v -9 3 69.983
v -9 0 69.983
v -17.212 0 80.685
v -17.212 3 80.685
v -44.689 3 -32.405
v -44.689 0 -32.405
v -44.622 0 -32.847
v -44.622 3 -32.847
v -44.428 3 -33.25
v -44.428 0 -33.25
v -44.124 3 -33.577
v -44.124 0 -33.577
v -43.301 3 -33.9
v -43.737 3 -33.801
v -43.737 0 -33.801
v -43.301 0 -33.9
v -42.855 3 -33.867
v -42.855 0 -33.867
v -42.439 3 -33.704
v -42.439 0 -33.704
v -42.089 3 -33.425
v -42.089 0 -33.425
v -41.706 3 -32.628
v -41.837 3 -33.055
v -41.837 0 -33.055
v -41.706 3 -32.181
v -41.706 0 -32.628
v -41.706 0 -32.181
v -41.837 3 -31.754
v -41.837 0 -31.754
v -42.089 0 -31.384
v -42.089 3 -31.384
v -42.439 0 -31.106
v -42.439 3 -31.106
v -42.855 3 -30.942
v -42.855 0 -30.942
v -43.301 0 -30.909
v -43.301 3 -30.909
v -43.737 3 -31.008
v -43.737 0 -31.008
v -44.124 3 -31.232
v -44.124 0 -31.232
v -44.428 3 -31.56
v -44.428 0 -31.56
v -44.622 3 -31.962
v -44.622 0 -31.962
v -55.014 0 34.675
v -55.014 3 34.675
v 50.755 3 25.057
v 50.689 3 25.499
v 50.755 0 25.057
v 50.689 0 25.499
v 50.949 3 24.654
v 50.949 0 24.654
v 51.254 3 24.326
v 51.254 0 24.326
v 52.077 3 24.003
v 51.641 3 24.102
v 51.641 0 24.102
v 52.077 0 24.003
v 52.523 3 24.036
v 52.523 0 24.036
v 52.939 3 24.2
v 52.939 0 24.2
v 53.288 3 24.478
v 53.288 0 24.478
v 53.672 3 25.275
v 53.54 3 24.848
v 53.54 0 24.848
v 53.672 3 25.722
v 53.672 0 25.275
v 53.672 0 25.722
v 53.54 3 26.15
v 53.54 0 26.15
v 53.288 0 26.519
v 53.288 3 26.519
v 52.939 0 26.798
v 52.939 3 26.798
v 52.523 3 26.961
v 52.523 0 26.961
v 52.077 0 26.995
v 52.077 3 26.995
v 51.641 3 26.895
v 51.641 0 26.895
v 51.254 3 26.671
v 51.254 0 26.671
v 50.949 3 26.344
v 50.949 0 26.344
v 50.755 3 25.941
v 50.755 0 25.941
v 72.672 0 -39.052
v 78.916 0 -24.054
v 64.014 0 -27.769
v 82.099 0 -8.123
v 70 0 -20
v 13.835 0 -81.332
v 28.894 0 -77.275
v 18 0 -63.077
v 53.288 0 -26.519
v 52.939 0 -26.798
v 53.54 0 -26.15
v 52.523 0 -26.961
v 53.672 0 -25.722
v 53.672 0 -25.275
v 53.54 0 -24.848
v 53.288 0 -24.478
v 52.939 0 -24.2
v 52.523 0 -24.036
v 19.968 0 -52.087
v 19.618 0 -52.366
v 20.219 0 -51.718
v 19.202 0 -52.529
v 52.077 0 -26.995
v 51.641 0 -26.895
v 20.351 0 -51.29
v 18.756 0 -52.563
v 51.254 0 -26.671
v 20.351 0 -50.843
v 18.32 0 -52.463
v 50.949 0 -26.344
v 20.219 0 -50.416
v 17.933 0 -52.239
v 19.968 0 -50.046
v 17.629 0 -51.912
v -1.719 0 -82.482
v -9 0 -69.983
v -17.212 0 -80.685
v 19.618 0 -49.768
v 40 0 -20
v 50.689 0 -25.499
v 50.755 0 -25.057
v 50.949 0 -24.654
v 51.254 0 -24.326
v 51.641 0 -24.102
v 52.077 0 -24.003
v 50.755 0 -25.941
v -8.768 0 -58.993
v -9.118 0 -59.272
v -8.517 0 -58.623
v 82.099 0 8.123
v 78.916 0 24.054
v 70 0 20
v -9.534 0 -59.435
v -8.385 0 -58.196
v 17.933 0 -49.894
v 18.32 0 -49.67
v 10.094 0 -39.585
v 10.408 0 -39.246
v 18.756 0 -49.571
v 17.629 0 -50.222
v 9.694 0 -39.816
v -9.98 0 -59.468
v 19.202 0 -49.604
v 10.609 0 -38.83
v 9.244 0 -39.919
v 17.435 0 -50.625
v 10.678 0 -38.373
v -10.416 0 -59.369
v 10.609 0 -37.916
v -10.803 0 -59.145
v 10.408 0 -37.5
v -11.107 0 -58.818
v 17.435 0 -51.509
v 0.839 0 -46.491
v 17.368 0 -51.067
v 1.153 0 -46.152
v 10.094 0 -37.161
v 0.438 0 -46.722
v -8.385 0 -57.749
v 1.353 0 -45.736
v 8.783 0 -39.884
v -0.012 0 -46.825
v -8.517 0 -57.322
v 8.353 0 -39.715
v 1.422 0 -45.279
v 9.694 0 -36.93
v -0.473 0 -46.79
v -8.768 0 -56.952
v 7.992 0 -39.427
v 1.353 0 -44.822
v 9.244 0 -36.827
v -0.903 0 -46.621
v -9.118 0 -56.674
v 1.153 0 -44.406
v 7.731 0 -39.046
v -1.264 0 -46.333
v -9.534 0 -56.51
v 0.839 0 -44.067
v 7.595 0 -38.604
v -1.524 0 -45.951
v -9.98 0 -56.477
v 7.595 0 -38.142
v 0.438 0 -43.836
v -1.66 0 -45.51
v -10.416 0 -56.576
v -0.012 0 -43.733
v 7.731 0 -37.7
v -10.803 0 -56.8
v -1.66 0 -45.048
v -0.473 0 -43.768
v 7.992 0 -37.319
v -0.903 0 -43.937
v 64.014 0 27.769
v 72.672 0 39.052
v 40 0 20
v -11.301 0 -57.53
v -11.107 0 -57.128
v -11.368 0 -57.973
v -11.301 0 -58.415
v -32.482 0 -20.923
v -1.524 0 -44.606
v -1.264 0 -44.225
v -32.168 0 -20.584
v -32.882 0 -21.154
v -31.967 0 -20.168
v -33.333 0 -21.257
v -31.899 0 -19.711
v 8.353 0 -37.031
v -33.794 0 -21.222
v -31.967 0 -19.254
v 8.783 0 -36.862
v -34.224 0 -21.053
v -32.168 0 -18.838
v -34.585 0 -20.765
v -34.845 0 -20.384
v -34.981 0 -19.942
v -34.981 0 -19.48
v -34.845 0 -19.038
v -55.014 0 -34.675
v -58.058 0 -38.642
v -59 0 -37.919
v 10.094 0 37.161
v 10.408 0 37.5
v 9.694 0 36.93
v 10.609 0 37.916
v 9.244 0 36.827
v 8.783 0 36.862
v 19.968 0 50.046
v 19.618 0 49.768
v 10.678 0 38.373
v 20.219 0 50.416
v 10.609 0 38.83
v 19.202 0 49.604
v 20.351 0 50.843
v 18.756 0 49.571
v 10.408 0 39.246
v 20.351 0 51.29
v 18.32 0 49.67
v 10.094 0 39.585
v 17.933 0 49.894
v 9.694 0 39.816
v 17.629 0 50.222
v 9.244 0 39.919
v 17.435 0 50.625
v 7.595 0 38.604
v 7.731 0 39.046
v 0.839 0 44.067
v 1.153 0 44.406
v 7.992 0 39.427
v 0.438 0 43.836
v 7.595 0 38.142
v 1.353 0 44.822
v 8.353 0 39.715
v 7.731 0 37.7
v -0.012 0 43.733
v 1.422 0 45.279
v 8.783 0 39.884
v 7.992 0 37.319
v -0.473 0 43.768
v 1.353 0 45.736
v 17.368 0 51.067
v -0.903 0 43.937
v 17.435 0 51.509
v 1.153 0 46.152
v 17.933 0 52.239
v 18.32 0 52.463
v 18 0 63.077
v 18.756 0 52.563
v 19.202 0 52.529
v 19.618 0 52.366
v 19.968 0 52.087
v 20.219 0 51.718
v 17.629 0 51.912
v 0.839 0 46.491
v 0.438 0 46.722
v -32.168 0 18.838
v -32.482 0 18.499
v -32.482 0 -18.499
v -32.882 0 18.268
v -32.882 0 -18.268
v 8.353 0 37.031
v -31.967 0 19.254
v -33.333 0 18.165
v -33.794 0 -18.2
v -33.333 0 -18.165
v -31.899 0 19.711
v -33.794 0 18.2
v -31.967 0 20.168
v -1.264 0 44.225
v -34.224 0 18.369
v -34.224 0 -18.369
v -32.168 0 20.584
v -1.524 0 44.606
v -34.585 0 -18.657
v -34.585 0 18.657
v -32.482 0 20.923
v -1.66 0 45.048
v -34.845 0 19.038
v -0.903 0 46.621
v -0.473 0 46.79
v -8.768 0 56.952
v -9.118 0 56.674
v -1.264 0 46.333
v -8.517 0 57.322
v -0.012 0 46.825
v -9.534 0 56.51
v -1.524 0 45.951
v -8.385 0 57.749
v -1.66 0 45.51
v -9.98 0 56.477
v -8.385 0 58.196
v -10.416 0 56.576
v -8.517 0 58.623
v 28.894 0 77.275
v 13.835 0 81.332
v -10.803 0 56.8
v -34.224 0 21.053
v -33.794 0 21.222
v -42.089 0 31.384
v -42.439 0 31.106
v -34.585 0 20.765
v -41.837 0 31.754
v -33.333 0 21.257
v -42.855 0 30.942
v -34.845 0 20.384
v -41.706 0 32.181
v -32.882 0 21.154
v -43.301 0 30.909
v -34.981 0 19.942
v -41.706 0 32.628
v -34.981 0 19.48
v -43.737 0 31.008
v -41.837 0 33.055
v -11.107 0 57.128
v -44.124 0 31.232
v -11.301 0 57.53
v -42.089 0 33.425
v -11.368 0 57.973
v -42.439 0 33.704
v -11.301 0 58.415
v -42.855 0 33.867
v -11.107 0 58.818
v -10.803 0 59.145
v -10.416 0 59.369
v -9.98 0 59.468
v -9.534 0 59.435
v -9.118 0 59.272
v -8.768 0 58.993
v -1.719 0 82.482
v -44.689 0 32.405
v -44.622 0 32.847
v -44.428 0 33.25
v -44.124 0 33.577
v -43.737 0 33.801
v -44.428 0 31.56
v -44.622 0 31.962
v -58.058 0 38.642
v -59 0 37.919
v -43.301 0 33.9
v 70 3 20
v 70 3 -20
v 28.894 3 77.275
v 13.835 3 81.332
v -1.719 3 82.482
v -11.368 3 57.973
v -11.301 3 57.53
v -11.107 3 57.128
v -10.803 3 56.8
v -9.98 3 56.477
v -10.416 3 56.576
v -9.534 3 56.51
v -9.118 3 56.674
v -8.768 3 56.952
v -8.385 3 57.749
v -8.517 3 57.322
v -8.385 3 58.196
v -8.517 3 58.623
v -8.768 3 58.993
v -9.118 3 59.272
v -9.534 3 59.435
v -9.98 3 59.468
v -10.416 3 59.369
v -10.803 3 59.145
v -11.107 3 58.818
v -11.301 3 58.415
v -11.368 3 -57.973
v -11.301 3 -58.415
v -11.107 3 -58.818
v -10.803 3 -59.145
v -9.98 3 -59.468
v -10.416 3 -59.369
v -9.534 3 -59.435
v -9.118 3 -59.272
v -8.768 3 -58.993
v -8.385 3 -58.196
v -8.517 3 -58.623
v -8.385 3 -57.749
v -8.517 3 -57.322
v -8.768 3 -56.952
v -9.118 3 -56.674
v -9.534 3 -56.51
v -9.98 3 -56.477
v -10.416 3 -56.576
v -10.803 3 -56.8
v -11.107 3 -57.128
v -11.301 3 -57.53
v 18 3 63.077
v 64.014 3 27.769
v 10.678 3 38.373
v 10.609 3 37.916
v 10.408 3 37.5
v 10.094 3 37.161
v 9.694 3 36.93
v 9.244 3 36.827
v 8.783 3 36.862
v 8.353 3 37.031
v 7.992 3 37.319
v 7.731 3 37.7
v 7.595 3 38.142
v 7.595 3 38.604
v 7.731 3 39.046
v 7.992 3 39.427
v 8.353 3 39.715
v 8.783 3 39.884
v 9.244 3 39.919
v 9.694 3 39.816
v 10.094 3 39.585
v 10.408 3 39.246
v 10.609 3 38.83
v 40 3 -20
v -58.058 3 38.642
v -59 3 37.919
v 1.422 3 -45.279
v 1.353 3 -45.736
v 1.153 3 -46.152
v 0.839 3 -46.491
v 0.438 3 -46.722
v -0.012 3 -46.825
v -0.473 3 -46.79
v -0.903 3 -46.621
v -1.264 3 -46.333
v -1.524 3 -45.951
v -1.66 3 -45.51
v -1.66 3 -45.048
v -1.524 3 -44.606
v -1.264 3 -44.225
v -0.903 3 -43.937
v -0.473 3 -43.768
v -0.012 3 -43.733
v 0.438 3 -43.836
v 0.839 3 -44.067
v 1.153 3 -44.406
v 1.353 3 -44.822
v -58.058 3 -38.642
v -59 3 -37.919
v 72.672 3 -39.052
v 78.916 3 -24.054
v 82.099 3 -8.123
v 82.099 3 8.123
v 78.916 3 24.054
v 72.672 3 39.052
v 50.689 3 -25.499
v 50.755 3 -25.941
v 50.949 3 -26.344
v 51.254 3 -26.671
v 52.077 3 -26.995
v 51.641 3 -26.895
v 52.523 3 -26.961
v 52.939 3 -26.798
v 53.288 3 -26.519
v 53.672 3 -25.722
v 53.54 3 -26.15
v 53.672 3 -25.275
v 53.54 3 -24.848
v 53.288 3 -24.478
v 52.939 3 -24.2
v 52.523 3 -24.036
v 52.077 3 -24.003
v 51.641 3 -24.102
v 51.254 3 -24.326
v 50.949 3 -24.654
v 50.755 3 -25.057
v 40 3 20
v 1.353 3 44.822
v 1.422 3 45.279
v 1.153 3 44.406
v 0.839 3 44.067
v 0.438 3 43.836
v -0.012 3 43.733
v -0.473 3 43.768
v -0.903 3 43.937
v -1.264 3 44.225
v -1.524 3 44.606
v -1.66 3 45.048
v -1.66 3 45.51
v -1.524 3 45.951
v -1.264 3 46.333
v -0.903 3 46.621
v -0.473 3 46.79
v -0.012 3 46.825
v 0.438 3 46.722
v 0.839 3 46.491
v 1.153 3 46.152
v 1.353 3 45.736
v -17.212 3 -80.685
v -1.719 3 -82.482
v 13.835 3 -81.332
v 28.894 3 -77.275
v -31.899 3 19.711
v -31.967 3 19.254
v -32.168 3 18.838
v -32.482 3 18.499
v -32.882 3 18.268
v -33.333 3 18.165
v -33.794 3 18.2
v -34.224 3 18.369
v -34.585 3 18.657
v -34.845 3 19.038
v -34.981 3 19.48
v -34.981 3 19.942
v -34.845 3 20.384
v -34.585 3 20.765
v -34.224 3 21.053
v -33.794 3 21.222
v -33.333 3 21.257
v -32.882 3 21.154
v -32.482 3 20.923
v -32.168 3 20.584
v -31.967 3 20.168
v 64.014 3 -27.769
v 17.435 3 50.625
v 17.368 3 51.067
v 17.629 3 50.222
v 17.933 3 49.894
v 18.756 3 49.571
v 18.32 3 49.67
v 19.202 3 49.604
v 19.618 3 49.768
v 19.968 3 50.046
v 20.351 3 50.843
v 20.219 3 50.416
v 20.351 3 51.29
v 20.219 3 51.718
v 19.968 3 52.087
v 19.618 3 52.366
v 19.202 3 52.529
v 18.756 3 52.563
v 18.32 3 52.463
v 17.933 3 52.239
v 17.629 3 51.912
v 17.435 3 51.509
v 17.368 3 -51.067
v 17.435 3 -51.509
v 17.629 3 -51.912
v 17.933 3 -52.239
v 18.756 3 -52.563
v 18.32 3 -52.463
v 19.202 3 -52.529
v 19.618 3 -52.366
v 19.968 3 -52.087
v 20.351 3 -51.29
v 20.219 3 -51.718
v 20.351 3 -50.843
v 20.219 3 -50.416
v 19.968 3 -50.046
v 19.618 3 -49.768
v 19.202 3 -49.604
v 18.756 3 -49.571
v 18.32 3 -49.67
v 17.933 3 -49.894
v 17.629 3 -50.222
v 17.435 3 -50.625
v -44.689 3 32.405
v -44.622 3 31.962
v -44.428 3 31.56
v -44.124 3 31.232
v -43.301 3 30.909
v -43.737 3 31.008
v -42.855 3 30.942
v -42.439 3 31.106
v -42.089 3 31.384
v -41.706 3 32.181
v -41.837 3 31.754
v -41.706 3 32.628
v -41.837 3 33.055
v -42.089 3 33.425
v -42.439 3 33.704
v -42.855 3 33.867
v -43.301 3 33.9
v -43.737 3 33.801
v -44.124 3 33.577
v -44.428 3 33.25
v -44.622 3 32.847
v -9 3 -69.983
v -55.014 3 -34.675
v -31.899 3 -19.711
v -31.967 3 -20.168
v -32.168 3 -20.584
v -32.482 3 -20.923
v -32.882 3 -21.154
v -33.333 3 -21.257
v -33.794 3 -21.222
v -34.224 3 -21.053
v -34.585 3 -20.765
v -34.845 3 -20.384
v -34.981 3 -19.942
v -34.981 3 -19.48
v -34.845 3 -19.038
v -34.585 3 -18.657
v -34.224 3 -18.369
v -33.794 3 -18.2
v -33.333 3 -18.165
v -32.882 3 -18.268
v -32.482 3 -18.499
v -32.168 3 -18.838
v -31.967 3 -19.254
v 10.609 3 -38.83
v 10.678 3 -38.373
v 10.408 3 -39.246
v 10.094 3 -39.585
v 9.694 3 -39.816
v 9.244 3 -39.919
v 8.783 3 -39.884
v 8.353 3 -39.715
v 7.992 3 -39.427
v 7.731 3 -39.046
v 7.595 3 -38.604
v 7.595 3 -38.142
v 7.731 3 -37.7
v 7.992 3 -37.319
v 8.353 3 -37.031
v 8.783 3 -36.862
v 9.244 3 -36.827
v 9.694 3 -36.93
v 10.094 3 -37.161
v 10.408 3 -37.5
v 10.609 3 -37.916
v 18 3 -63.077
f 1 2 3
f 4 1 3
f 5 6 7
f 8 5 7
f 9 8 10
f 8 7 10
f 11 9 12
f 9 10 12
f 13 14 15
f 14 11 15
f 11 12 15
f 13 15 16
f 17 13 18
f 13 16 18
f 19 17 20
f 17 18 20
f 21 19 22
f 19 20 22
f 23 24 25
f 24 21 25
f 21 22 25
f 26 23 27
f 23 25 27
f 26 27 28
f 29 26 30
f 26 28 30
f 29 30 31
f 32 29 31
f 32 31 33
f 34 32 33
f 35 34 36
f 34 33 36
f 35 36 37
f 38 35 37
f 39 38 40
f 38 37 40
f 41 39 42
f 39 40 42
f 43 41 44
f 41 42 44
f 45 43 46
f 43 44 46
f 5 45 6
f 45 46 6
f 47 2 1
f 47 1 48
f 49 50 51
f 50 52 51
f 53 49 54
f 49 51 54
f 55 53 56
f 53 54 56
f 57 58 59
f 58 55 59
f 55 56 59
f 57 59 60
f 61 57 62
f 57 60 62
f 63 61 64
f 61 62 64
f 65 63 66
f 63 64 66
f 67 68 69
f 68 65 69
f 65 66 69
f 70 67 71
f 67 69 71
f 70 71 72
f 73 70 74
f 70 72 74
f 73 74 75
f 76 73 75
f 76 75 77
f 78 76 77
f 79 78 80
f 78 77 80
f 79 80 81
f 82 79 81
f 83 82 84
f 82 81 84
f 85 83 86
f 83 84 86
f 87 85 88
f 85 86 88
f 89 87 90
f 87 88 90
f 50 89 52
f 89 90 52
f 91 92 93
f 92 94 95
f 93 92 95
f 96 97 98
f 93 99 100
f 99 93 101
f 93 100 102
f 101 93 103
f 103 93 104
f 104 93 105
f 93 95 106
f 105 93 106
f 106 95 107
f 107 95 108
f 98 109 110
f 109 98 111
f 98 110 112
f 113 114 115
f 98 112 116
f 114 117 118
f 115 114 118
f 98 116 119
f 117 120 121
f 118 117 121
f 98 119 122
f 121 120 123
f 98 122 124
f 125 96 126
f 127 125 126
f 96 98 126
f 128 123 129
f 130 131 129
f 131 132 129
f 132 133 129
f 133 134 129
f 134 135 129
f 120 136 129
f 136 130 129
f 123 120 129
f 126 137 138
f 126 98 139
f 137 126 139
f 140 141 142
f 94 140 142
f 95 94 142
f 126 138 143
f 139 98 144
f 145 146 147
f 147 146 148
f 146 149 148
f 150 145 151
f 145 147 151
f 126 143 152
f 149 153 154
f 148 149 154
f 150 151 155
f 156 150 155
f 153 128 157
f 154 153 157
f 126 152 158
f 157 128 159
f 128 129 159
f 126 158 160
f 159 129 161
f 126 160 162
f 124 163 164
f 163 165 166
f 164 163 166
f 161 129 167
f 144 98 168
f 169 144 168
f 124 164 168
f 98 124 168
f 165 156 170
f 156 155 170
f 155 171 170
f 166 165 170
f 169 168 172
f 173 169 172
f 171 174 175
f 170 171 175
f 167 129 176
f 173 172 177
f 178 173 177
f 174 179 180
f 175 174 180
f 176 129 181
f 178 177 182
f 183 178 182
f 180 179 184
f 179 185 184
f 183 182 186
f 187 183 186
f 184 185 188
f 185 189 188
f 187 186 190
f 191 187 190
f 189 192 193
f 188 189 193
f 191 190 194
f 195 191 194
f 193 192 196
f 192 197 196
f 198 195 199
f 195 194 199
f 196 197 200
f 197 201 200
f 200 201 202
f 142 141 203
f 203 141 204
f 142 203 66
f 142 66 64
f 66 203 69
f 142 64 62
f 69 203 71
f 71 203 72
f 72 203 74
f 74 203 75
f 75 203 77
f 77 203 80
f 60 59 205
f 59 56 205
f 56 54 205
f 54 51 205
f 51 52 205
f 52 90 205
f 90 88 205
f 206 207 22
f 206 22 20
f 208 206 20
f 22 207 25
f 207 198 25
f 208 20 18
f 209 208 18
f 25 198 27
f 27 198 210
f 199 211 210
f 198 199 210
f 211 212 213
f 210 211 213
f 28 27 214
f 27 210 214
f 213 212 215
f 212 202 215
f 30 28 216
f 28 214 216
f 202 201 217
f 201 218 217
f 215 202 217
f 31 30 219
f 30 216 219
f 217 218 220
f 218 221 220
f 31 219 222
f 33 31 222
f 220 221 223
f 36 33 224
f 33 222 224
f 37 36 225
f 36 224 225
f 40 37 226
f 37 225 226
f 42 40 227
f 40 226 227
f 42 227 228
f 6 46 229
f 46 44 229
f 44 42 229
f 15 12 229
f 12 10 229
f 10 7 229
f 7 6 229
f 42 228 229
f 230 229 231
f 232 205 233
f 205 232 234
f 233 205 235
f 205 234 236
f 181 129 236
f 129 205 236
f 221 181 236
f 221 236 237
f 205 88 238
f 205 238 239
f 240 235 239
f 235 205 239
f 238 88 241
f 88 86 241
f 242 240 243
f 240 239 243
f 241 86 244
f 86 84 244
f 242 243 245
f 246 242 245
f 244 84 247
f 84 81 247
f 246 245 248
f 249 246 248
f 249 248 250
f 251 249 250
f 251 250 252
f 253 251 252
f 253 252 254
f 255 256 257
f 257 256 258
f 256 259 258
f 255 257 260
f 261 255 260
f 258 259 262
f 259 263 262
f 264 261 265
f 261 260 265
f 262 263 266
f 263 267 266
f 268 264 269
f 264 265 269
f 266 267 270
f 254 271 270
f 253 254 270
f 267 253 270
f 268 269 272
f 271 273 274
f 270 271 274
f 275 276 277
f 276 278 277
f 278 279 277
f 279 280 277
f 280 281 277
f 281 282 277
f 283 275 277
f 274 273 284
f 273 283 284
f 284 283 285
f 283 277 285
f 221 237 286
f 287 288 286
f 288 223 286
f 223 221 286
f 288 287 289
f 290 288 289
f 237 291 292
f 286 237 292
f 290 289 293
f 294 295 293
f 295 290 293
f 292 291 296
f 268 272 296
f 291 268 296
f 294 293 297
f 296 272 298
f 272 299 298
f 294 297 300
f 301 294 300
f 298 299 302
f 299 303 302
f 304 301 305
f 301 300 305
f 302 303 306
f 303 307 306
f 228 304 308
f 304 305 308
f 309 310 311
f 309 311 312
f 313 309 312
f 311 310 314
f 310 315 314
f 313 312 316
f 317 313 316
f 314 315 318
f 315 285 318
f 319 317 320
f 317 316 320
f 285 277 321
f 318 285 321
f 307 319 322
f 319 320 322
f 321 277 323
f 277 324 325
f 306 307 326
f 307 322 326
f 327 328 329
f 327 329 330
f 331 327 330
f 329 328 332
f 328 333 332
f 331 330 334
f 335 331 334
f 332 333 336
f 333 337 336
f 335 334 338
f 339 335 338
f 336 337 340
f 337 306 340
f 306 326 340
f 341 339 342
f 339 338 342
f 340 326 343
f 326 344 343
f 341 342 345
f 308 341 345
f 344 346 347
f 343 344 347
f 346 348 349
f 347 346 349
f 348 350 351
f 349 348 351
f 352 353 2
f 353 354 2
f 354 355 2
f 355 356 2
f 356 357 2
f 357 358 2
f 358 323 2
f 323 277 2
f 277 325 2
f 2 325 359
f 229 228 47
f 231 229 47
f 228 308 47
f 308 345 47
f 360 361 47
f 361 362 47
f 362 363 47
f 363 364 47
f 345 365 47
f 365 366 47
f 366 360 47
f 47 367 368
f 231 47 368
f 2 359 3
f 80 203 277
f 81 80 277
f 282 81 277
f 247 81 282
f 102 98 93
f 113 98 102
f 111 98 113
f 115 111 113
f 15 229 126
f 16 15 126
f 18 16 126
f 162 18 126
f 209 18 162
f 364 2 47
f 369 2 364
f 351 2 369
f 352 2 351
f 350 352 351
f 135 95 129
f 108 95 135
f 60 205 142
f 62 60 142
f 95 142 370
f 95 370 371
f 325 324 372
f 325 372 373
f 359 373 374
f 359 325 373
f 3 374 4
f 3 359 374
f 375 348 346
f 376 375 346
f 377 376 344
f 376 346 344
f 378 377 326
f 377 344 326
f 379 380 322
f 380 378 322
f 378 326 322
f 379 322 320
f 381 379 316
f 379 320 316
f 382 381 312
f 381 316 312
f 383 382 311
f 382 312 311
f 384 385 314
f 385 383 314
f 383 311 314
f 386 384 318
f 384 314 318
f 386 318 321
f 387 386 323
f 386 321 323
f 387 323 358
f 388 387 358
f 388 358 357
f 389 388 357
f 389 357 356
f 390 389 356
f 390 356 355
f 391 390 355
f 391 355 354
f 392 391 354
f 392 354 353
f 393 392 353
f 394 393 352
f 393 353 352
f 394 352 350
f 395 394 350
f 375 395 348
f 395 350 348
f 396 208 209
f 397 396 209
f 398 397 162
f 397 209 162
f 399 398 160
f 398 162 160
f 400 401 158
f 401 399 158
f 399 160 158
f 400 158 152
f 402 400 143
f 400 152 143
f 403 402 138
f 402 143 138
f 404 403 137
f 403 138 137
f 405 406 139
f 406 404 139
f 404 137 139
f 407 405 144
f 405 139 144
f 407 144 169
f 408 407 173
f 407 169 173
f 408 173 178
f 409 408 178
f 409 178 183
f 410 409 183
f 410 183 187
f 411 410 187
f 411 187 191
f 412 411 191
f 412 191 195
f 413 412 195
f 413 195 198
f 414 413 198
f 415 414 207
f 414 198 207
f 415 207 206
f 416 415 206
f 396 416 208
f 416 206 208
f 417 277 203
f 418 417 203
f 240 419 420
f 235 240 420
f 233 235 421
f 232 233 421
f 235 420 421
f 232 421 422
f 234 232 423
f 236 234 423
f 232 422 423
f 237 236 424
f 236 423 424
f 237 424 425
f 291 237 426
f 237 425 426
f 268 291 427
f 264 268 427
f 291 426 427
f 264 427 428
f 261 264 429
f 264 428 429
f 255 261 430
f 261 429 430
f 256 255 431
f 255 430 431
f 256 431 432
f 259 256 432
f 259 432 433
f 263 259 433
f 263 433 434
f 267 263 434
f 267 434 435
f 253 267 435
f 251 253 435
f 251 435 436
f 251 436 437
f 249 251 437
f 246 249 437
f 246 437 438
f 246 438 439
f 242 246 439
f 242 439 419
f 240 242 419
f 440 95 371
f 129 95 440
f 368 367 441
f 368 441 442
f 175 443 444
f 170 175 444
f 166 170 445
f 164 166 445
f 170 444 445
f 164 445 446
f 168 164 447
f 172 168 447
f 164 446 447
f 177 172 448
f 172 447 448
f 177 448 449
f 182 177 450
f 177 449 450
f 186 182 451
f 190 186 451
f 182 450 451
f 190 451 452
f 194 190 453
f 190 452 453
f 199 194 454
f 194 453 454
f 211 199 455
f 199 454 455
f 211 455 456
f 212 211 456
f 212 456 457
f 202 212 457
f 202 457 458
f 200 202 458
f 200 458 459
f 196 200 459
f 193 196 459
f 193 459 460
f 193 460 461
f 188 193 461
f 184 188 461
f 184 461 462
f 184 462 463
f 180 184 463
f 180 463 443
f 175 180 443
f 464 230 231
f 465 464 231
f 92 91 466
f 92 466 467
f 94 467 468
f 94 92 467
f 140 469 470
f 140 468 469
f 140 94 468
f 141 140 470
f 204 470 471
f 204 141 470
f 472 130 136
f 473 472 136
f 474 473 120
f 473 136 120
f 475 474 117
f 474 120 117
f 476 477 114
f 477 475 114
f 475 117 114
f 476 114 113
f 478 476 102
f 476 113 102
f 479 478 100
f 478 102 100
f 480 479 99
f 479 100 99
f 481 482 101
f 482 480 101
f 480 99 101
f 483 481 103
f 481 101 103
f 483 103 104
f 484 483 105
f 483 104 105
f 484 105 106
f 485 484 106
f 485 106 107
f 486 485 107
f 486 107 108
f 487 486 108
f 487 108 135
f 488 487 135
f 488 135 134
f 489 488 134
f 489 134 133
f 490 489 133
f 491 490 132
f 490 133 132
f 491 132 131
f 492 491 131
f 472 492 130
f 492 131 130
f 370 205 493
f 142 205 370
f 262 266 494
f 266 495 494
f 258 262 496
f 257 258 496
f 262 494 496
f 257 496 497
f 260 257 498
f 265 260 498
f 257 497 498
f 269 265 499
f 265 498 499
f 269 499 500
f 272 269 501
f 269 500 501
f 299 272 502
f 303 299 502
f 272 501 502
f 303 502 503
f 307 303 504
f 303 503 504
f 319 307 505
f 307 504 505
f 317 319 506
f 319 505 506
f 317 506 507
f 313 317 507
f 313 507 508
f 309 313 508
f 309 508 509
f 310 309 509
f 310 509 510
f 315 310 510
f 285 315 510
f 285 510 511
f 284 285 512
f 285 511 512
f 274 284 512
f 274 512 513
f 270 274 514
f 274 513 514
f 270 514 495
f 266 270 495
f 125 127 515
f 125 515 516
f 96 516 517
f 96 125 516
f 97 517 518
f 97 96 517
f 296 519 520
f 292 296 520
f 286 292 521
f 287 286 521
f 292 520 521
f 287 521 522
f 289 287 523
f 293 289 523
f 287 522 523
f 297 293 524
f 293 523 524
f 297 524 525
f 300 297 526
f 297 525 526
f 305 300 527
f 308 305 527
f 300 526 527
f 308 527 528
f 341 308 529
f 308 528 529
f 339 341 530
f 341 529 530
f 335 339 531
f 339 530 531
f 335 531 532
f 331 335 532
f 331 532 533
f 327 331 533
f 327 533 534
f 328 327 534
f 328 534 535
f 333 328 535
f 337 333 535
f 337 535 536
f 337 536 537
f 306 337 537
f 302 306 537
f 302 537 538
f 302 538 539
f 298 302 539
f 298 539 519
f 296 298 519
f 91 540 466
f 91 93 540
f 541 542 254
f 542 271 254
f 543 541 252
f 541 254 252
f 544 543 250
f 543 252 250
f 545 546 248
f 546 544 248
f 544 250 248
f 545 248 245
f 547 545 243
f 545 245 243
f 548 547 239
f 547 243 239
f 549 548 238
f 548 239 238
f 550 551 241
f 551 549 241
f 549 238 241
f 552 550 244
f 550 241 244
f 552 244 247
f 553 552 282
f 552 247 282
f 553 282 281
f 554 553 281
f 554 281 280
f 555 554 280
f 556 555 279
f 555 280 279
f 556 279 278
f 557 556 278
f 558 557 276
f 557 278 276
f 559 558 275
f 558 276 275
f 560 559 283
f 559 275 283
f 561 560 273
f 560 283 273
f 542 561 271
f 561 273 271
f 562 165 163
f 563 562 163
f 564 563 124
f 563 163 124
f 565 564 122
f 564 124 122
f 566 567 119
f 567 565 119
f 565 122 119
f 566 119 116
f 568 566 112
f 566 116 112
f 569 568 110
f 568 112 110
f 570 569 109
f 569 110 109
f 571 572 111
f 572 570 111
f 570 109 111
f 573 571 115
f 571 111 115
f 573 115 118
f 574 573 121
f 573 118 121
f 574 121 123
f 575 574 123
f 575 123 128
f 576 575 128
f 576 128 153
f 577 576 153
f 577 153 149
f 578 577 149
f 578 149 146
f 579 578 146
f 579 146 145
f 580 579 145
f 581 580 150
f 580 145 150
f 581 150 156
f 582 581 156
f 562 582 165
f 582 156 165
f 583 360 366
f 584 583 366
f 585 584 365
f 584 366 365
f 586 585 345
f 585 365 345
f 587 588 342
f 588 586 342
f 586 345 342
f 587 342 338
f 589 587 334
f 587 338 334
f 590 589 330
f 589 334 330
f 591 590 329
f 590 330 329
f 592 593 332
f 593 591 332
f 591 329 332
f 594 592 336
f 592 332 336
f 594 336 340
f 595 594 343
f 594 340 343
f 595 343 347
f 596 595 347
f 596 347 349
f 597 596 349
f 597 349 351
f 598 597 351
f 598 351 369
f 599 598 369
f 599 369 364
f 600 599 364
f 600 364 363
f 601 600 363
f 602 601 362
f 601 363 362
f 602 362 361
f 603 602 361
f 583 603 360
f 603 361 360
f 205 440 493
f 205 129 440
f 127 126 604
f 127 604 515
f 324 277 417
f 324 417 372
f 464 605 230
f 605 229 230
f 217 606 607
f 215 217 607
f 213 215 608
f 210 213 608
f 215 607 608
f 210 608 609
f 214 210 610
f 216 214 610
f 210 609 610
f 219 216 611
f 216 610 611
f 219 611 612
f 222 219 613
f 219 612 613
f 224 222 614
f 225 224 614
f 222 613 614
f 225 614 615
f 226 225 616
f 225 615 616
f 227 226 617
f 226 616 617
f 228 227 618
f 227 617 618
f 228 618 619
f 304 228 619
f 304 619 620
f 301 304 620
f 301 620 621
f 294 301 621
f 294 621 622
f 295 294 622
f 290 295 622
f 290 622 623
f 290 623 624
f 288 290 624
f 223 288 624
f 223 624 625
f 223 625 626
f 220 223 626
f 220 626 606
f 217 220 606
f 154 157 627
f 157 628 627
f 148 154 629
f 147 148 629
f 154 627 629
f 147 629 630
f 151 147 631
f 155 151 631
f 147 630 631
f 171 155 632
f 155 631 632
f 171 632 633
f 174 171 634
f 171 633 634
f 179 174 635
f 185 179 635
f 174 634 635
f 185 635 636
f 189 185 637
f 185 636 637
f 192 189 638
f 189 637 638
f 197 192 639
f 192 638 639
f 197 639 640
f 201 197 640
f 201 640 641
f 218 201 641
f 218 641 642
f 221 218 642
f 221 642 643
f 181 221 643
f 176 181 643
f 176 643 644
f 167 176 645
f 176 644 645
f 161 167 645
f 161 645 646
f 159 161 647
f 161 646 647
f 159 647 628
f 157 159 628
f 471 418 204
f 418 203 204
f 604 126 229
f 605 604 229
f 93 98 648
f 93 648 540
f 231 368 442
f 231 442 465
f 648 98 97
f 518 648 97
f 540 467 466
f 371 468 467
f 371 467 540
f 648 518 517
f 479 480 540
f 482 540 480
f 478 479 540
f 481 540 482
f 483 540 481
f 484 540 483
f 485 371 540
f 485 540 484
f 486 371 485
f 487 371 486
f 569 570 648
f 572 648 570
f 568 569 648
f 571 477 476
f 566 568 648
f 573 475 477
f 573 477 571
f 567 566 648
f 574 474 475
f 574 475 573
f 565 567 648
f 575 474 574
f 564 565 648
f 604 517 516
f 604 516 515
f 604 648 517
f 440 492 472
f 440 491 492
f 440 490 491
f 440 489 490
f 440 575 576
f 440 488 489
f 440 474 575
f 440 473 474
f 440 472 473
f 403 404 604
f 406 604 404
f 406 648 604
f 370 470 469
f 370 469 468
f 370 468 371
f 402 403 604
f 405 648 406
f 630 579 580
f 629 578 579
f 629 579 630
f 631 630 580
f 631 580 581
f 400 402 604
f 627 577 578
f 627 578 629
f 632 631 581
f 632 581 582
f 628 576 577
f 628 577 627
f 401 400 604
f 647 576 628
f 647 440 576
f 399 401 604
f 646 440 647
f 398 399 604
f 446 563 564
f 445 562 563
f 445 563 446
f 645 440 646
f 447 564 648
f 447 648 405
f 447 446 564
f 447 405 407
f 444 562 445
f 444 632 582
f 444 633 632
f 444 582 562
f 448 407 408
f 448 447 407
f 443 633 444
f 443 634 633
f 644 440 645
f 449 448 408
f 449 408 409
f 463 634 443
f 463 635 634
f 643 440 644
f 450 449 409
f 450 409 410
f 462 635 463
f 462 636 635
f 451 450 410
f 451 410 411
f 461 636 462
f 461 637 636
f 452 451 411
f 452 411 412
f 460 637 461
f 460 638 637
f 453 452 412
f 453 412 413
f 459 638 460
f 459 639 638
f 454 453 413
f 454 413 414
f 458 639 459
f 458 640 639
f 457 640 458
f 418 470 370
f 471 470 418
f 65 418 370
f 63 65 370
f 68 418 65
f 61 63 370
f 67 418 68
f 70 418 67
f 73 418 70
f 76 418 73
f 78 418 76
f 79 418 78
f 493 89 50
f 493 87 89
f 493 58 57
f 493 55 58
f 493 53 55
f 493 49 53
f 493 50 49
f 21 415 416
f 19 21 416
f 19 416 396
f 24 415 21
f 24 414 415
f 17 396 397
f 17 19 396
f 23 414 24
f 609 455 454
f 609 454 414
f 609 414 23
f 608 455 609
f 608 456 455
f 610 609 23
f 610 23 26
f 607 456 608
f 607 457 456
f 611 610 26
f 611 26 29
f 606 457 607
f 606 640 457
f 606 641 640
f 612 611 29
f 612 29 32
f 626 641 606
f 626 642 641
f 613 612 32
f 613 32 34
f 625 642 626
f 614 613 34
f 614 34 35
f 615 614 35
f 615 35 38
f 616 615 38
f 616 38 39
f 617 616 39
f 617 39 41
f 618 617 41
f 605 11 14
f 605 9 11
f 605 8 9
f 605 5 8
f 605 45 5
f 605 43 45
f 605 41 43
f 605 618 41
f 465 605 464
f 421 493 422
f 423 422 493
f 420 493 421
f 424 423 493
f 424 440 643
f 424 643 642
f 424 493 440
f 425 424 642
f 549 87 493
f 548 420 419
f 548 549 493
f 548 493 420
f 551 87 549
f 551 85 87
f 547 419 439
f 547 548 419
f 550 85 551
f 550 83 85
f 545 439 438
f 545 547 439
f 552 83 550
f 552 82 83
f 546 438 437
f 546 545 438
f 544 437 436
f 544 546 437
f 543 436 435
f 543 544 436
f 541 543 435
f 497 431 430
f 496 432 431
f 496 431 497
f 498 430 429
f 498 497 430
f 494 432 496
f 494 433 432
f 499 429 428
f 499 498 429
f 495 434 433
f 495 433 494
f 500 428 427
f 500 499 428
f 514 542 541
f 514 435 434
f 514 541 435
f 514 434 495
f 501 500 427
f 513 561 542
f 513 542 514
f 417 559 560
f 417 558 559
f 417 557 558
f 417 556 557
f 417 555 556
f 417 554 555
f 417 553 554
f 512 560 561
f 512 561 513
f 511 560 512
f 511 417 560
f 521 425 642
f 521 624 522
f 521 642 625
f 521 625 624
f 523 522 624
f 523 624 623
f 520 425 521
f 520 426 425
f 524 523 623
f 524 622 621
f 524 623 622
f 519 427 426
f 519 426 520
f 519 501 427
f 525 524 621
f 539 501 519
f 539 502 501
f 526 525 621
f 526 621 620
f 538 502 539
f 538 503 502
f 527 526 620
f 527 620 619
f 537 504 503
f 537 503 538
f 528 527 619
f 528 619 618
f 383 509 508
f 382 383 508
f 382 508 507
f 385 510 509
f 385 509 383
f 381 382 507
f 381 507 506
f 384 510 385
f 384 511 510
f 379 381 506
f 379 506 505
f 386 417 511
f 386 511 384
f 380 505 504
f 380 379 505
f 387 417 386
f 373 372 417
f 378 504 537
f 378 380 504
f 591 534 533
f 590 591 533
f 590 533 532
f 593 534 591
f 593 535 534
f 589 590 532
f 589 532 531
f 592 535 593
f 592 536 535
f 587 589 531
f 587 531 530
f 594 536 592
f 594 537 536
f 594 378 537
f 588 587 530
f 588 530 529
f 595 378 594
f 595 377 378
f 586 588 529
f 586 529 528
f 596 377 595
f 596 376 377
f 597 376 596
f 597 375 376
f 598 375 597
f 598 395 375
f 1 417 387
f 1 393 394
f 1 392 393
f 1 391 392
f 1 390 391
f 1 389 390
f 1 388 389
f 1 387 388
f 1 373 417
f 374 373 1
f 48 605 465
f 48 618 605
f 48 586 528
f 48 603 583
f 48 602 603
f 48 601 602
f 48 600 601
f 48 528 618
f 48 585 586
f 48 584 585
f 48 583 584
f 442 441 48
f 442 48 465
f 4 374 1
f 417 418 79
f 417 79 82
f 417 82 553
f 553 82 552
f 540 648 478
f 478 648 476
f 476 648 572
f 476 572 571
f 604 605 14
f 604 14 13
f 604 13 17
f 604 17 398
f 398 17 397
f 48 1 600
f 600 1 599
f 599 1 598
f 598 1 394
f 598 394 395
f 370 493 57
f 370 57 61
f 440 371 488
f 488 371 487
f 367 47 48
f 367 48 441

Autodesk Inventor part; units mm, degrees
ref_plane "YZ Plane" through (0, 0, 0) normal (1, 0, 0) x (0, 1, 0)
ref_plane "XZ Plane" through (0, 0, 0) normal (0, 1, 0) x (-1, 0, 0)
ref_plane "XY Plane" through (0, 0, 0) normal (0, 0, 1) x (1, 0, 0)
sketch "Boceto1" plane through (0, 0, 0) normal (0, 1, 0) x (-1, 0, 0)
  line L0 (0, 0) -> (0, -52.2241) construction
  line L1 (0, 0) -> (0, 54.663) construction
  line L2 (0, 0) -> (-57.9564, 0) construction
  line L3 (0, 0) -> (56.3387, 0) construction
  line L4 (-70, -20) -> (-40, -20)
  line L5 (-40, -20) -> (-40, 20)
  line L6 (-40, 20) -> (-70, 20)
  line L7 (-70, 20) -> (-70, -20)
  line L8 (-70, -20) -> (-40, 20) construction
  line L9 (-40, -20) -> (-70, 20) construction
  line L10 (-18, 63.0769) -> (-64.0145, 27.7688)
  line L11 (9, 69.9829) -> (55.0145, 34.6747)
  line L12 (9, 69.9829) -> (17.2117, 80.6846)
  line L13 (-18, 63.0769) -> (-28.8943, 77.2746)
  line L14 (-64.0145, 27.7688) -> (-72.6721, 39.0515)
  line L15 (-18, -63.0769) -> (-64.0145, -27.7688)
  line L16 (9, -69.9829) -> (55.0145, -34.6747)
  line L17 (9, -69.9829) -> (17.2117, -80.6846)
  line L18 (-18, -63.0769) -> (-28.8943, -77.2746)
  line L19 (-64.0145, -27.7688) -> (-72.6721, -39.0515)
  arc A0 (-72.6721, 39.0515) -> (-72.6721, -39.0515) centre (0, 0) ccw
  arc A1 (17.2117, 80.6846) -> (-28.8943, 77.2746) centre (0, 0) ccw
  arc A2 (-28.8943, -77.2746) -> (17.2117, -80.6846) centre (0, 0) ccw
  line L20 (59, 37.9189) -> (59, -37.9189)
  line L21 (58.0583, 38.6415) -> (59, 37.9189)
  line L22 (55.0145, 34.6747) -> (58.0583, 38.6415)
  line L23 (58.0583, -38.6415) -> (59, -37.9189)
  line L24 (55.0145, -34.6747) -> (58.0583, -38.6415)
  circle A3 centre (-18.868, 51.0667) radius 1.5
  circle A4 centre (-52.1888, 25.4987) radius 1.5
  line L25 (-41.0072, 45.4229) -> (-35.5284, 38.2827) construction
  line L26 (-18.868, 51.0667) -> (-52.1888, 25.4987) construction
  line L27 (32.0072, 52.3288) -> (22.9685, 40.5493) construction
  circle A5 centre (9.868, 57.9726) radius 1.5
  circle A6 centre (43.1888, 32.4046) radius 1.5
  circle A7 centre (-18.868, -51.0667) radius 1.5
  circle A8 centre (-52.1888, -25.4987) radius 1.5
  circle A9 centre (9.868, -57.9726) radius 1.5
  circle A10 centre (43.1888, -32.4046) radius 1.5
  line L28 (43.1888, 32.4046) -> (9.868, 57.9726) construction
  point P0 (-55, 0)
  point P1 (-70, 0)
  point P2 (26.5284, 45.1886)
  dimension "d1" = 30
  dimension "d2" = 40
  dimension "d3" = 70
  dimension "d9" = 52.5
  dimension "d10" = 52.5
  dimension "d11" = 61
  dimension "d12" = 61
  dimension "d13" = 58
  dimension "d17" = 90
  dimension "d18" = 9
  dimension "d19" = 18
  dimension "d20" = 58
  dimension "d21" = 90
  dimension "d22" = 90
  dimension "d23" = 82.5
  dimension "d24" = 82.5
  dimension "d26" = 59
  dimension "d27" = 5
  dimension "d28" = 5
  dimension "d29" = 3
  dimension "d30" = 3
  dimension "d31" = 42
  dimension "d32" = 9
  dimension "d37" = 90
  dimension "d38" = 3
  dimension "d39" = 3
  dimension "d40" = 42
  dimension "d41" = 9
extrude "Extrusión1" add sketch "Boceto1" along normal blind 3
sketch "Boceto2" plane through (0, 3, 0) normal (0, 1, 0) x (1, 0, 0)
  line L0 (-55.0145, -34.6747) -> (-9, -69.9829) projected
  line L1 (-32.0072, -52.3288) -> (-0.1642, -10.8301) construction
  circle A0 centre (-33.4486, -19.711) radius 1.55
  circle A1 centre (-0.1278, -45.2789) radius 1.55
  line L2 (-33.4486, -19.711) -> (-0.1278, -45.2789) construction
  circle A2 centre (-43.1888, -32.4046) radius 1.5 construction
  line L3 (18, -63.0769) -> (64.0145, -27.7688) projected
  line L4 (41.0072, -45.4229) -> (14.3892, -10.7335) construction
  circle A3 centre (9.1278, -38.373) radius 1.55
  circle A4 centre (42.4486, -12.805) radius 1.55
  line L5 (42.4486, -12.805) -> (9.1278, -38.373) construction
  circle A5 centre (18.868, -51.0667) radius 1.5 construction
  line L6 (-59, 37.9189) -> (-59, -37.9189) construction
  line L7 (-59, 0) -> (115.874, 0) construction
  circle A6 centre (-33.4486, 19.711) radius 1.55
  circle A7 centre (-0.1278, 45.2789) radius 1.55
  circle A8 centre (9.1278, 38.373) radius 1.55
  circle A9 centre (42.4486, 12.805) radius 1.55
  point P0 (0, 0)
  dimension "d44" = 3.1
  dimension "d45" = 3.1
  dimension "d46" = 21
  dimension "d47" = 42
  dimension "d48" = 16
  dimension "d51" = 16
  dimension "d52" = 21
  dimension "d53" = 42
extrude "Extrusión2" cut sketch "Boceto2" against normal blind 10
properties part number "newbasecentral"
